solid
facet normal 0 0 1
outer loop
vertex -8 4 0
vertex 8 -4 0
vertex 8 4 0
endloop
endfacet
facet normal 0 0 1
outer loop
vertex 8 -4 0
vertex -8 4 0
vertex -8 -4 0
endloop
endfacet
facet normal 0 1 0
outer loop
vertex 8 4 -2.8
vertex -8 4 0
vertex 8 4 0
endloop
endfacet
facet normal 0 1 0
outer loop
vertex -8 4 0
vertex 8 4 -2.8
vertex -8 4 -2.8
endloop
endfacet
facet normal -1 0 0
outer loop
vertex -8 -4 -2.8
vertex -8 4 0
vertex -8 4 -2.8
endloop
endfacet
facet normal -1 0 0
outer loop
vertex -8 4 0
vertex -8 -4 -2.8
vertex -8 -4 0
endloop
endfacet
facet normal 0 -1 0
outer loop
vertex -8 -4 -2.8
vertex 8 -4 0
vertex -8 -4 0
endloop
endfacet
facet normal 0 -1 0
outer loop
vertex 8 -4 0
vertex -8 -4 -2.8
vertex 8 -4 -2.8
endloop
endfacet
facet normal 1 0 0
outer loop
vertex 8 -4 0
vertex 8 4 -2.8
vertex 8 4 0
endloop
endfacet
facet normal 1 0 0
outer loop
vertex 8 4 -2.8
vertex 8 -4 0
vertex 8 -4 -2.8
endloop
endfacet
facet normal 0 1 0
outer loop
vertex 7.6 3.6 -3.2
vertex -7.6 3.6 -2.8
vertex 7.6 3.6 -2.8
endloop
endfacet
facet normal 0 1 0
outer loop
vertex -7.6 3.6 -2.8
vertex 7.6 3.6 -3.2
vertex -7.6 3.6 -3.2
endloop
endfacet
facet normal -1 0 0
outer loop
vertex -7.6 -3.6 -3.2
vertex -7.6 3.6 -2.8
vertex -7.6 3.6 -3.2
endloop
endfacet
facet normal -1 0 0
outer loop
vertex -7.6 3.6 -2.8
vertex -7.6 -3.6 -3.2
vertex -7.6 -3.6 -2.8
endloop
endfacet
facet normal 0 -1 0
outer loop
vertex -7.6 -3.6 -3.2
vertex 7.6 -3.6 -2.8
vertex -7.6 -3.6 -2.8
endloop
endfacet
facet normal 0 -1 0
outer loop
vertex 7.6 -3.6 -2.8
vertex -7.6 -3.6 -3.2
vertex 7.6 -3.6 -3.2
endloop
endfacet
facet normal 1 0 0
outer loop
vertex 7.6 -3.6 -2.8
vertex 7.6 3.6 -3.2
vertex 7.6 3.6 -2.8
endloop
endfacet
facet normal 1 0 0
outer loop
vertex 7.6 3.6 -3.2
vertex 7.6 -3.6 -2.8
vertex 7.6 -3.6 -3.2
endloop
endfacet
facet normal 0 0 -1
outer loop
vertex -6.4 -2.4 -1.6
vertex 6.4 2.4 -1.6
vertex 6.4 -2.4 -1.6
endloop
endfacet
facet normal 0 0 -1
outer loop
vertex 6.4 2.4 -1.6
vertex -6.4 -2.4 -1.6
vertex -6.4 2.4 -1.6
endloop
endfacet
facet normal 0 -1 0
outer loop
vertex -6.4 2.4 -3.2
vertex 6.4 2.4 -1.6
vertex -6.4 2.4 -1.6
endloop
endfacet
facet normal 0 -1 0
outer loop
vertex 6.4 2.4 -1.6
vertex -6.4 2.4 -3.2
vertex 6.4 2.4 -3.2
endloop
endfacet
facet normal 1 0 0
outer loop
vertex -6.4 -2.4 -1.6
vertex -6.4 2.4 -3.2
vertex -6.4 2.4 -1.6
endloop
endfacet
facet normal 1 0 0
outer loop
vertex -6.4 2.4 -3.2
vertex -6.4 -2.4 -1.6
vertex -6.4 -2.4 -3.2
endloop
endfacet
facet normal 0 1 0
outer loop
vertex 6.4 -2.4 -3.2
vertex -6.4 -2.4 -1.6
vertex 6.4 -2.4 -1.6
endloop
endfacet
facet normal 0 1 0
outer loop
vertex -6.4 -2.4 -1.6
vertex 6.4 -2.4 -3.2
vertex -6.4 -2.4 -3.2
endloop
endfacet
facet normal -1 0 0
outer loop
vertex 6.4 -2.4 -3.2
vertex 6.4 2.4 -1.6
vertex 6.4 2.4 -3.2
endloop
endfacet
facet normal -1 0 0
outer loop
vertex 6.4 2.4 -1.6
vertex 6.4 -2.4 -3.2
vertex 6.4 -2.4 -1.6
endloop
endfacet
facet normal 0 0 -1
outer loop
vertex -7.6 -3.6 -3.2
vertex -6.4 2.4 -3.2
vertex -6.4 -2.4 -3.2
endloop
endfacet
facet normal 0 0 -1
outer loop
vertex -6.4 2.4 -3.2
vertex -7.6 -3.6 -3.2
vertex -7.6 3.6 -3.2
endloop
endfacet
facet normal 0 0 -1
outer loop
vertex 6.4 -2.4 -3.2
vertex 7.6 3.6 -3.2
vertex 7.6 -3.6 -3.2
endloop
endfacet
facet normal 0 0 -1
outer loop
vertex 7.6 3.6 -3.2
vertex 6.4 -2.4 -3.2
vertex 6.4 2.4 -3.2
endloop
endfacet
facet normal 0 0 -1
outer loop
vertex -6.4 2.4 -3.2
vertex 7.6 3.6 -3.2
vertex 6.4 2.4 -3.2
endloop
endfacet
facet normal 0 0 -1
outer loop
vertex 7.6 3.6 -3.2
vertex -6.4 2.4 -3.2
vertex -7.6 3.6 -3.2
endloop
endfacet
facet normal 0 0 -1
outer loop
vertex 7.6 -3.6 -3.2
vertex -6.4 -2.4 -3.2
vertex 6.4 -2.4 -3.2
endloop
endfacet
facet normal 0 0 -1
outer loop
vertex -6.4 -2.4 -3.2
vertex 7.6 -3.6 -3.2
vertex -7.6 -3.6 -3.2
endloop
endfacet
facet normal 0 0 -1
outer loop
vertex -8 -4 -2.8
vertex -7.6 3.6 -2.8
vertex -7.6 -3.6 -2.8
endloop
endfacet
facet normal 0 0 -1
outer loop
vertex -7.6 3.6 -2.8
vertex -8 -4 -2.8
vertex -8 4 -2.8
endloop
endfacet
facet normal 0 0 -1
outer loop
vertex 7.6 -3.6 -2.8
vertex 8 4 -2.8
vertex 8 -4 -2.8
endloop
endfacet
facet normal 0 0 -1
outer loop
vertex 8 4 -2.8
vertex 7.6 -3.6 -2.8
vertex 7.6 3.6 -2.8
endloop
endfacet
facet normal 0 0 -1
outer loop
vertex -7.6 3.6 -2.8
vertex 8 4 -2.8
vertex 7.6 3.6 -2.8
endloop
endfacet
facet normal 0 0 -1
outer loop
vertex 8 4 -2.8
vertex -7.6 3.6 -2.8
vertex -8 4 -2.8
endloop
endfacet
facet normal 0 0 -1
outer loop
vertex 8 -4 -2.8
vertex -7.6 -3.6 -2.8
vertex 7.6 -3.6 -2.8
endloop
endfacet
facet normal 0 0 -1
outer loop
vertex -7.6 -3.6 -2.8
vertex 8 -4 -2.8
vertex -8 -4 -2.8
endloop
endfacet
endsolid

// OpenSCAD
// file: ../p/box5.scad
use <../lib.scad>
function ldraw_lib__box5() = [
// 0 Box with 5 Faces and All Edges
// 0 Name: box5.dat
// 0 Author: James Jessiman
// 0 !LDRAW_ORG Primitive UPDATE 2012-01
// 0 !LICENSE Licensed under CC BY 2.0 and CC BY 4.0 : see CAreadme.txt
// 
// 0 BFC CERTIFY CCW
  [0,"BFC","CERTIFY"],
  [0,"BFC","CCW"],
// 
// 0 !HISTORY 2002-04-03 [sbliss] Modified for BFC compliance
// 0 !HISTORY 2002-04-25 [PTadmin] Official Update 2002-02
// 0 !HISTORY 2007-06-24 [PTadmin] Header formatted for Contributor Agreement
// 0 !HISTORY 2008-07-01 [PTadmin] Official Update 2008-01
// 0 !HISTORY 2012-02-16 [Philo] Changed to CCW
// 0 !HISTORY 2012-03-30 [PTadmin] Official Update 2012-01
// 
// 
// 2 24 1 1 1 -1 1 1
  [2,24,1,1,1,-1,1,1],
// 2 24 -1 1 1 -1 1 -1
  [2,24,-1,1,1,-1,1,-1],
// 2 24 -1 1 -1 1 1 -1
  [2,24,-1,1,-1,1,1,-1],
// 2 24 1 1 -1 1 1 1
  [2,24,1,1,-1,1,1,1],
// 2 24 1 0 1 -1 0 1
  [2,24,1,0,1,-1,0,1],
// 2 24 -1 0 1 -1 0 -1
  [2,24,-1,0,1,-1,0,-1],
// 2 24 -1 0 -1 1 0 -1
  [2,24,-1,0,-1,1,0,-1],
// 2 24 1 0 -1 1 0 1
  [2,24,1,0,-1,1,0,1],
// 2 24 1 0 1 1 1 1
  [2,24,1,0,1,1,1,1],
// 2 24 -1 0 1 -1 1 1
  [2,24,-1,0,1,-1,1,1],
// 2 24 1 0 -1 1 1 -1
  [2,24,1,0,-1,1,1,-1],
// 2 24 -1 0 -1 -1 1 -1
  [2,24,-1,0,-1,-1,1,-1],
// 4 16 -1 1 1 1 1 1 1 1 -1 -1 1 -1
  [4,16,-1,1,1,1,1,1,1,1,-1,-1,1,-1],
// 4 16 -1 1 1 -1 0 1 1 0 1 1 1 1
  [4,16,-1,1,1,-1,0,1,1,0,1,1,1,1],
// 4 16 -1 1 -1 -1 0 -1 -1 0 1 -1 1 1
  [4,16,-1,1,-1,-1,0,-1,-1,0,1,-1,1,1],
// 4 16 1 1 -1 1 0 -1 -1 0 -1 -1 1 -1
  [4,16,1,1,-1,1,0,-1,-1,0,-1,-1,1,-1],
// 4 16 1 1 1 1 0 1 1 0 -1 1 1 -1
  [4,16,1,1,1,1,0,1,1,0,-1,1,1,-1],
];
makepoly(ldraw_lib__box5(), line=0.2);
// file: ../p/box4.scad
use <../lib.scad>
function ldraw_lib__box4() = [
// 0 Box with 4 Faces (2 Parallel Pairs) and All Edges
// 0 Name: box4.dat
// 0 Author: James Jessiman
// 0 !LDRAW_ORG Primitive UPDATE 2012-01
// 0 !LICENSE Licensed under CC BY 2.0 and CC BY 4.0 : see CAreadme.txt
// 
// 0 BFC CERTIFY CCW
  [0,"BFC","CERTIFY"],
  [0,"BFC","CCW"],
// 
// 0 !HISTORY 2002-04-03 [sbliss] Modified for BFC compliance
// 0 !HISTORY 2002-04-25 [PTadmin] Official Update 2002-02
// 0 !HISTORY 2007-06-24 [PTadmin] Header formatted for Contributor Agreement
// 0 !HISTORY 2008-07-01 [PTadmin] Official Update 2008-01
// 0 !HISTORY 2012-02-16 [Philo] Changed to CCW
// 0 !HISTORY 2012-03-30 [PTadmin] Official Update 2012-01
// 
// 
// 2 24 1 1 1 -1 1 1
  [2,24,1,1,1,-1,1,1],
// 2 24 -1 1 1 -1 1 -1
  [2,24,-1,1,1,-1,1,-1],
// 2 24 -1 1 -1 1 1 -1
  [2,24,-1,1,-1,1,1,-1],
// 2 24 1 1 -1 1 1 1
  [2,24,1,1,-1,1,1,1],
// 2 24 1 0 1 -1 0 1
  [2,24,1,0,1,-1,0,1],
// 2 24 -1 0 1 -1 0 -1
  [2,24,-1,0,1,-1,0,-1],
// 2 24 -1 0 -1 1 0 -1
  [2,24,-1,0,-1,1,0,-1],
// 2 24 1 0 -1 1 0 1
  [2,24,1,0,-1,1,0,1],
// 2 24 1 0 1 1 1 1
  [2,24,1,0,1,1,1,1],
// 2 24 -1 0 1 -1 1 1
  [2,24,-1,0,1,-1,1,1],
// 2 24 1 0 -1 1 1 -1
  [2,24,1,0,-1,1,1,-1],
// 2 24 -1 0 -1 -1 1 -1
  [2,24,-1,0,-1,-1,1,-1],
// 4 16 -1 1 1 -1 0 1 1 0 1 1 1 1
  [4,16,-1,1,1,-1,0,1,1,0,1,1,1,1],
// 4 16 -1 1 -1 -1 0 -1 -1 0 1 -1 1 1
  [4,16,-1,1,-1,-1,0,-1,-1,0,1,-1,1,1],
// 4 16 1 1 -1 1 0 -1 -1 0 -1 -1 1 -1
  [4,16,1,1,-1,1,0,-1,-1,0,-1,-1,1,-1],
// 4 16 1 1 1 1 0 1 1 0 -1 1 1 -1
  [4,16,1,1,1,1,0,1,1,0,-1,1,1,-1],
];
makepoly(ldraw_lib__box4(), line=0.2);
// file: s/3069bs01.scad
use <../../lib.scad>
use <../../p/box4.scad>
use <../../p/box5.scad>
function ldraw_lib__s__3069bs01() = [
// 0 ~Tile  1 x  2 with Groove without Top Face
// 0 Name: s\3069bs01.dat
// 0 Author: Santeri Piippo [arezey]
// 0 !LDRAW_ORG Subpart UPDATE 2010-02
// 0 !LICENSE Licensed under CC BY 2.0 and CC BY 4.0 : see CAreadme.txt
// 
// 0 BFC CERTIFY CCW
  [0,"BFC","CERTIFY"],
  [0,"BFC","CCW"],
// 
// 0 !HISTORY 2010-07-05 [PTadmin] Official Update 2010-02
// 
// 
// 1 16 0 0 0 20 0 0 0 7 0 0 0 10 box4.dat
  [1,16,0,0,0,20,0,0,0,7,0,0,0,10, ldraw_lib__box4()],
// 1 16 0 7 0 19 0 0 0 1 0 0 0 9 box4.dat
  [1,16,0,7,0,19,0,0,0,1,0,0,0,9, ldraw_lib__box4()],
// 0 BFC INVERTNEXT
  [0,"BFC","INVERTNEXT"],
// 1 16 0 8 0 16 0 0 0 -4 0 0 0 6 box5.dat
  [1,16,0,8,0,16,0,0,0,-4,0,0,0,6, ldraw_lib__box5()],
// 4 16 -19 8 9 -16 8 6 -16 8 -6 -19 8 -9
  [4,16,-19,8,9,-16,8,6,-16,8,-6,-19,8,-9],
// 4 16 19 8 -9 16 8 -6 16 8 6 19 8 9
  [4,16,19,8,-9,16,8,-6,16,8,6,19,8,9],
// 4 16 19 8 9 16 8 6 -16 8 6 -19 8 9
  [4,16,19,8,9,16,8,6,-16,8,6,-19,8,9],
// 4 16 -19 8 -9 -16 8 -6 16 8 -6 19 8 -9
  [4,16,-19,8,-9,-16,8,-6,16,8,-6,19,8,-9],
// 4 16 -20 7 10 -19 7 9 -19 7 -9 -20 7 -10
  [4,16,-20,7,10,-19,7,9,-19,7,-9,-20,7,-10],
// 4 16 20 7 -10 19 7 -9 19 7 9 20 7 10
  [4,16,20,7,-10,19,7,-9,19,7,9,20,7,10],
// 4 16 20 7 10 19 7 9 -19 7 9 -20 7 10
  [4,16,20,7,10,19,7,9,-19,7,9,-20,7,10],
// 4 16 -20 7 -10 -19 7 -9 19 7 -9 20 7 -10
  [4,16,-20,7,-10,-19,7,-9,19,7,-9,20,7,-10],
// 0 //
];
makepoly(ldraw_lib__s__3069bs01(), line=0.2);
// file: 3069b.scad
use <../lib.scad>
use <s/3069bs01.scad>
function ldraw_lib__3069b() = [
// 0 Tile  1 x  2 with Groove
// 0 Name: 3069b.dat
// 0 Author: Santeri Piippo [arezey]
// 0 !LDRAW_ORG Part UPDATE 2010-02
// 0 !LICENSE Licensed under CC BY 2.0 and CC BY 4.0 : see CAreadme.txt
// 
// 0 BFC CERTIFY CCW
  [0,"BFC","CERTIFY"],
  [0,"BFC","CCW"],
// 
// 0 !HISTORY 2010-07-05 [PTadmin] Official Update 2010-02
// 
// 
// 4 16 20 0 -10 20 0 10 -20 0 10 -20 0 -10
  [4,16,20,0,-10,20,0,10,-20,0,10,-20,0,-10],
// 1 16 0 0 0 1 0 0 0 1 0 0 0 1 s\3069bs01.dat
  [1,16,0,0,0,1,0,0,0,1,0,0,0,1, ldraw_lib__s__3069bs01()],
// 0 //
];
makepoly(ldraw_lib__3069b(), line=0.2);
// main file
use <../lib.scad>
use <3069b.scad>
function ldraw_lib__59489() = [
// 0 =Tile  1 x  2 with Groove
// 0 Name: 59489.dat
// 0 Author: Michael Heidemann [mikeheide]
// 0 !LDRAW_ORG Part Alias UPDATE 2014-02
// 0 !LICENSE Licensed under CC BY 2.0 and CC BY 4.0 : see CAreadme.txt
// 
// 0 BFC CERTIFY CCW
  [0,"BFC","CERTIFY"],
  [0,"BFC","CCW"],
// 
// 0 !HISTORY 2014-12-23 [PTadmin] Official Update 2014-02
// 
// 
// 0 // Alias of 3069b
// 
// 1 16 0 0 0 1 0 0 0 1 0 0 0 1 3069b.dat
  [1,16,0,0,0,1,0,0,0,1,0,0,0,1, ldraw_lib__3069b()],
];
makepoly(ldraw_lib__59489(), line=0.2);
